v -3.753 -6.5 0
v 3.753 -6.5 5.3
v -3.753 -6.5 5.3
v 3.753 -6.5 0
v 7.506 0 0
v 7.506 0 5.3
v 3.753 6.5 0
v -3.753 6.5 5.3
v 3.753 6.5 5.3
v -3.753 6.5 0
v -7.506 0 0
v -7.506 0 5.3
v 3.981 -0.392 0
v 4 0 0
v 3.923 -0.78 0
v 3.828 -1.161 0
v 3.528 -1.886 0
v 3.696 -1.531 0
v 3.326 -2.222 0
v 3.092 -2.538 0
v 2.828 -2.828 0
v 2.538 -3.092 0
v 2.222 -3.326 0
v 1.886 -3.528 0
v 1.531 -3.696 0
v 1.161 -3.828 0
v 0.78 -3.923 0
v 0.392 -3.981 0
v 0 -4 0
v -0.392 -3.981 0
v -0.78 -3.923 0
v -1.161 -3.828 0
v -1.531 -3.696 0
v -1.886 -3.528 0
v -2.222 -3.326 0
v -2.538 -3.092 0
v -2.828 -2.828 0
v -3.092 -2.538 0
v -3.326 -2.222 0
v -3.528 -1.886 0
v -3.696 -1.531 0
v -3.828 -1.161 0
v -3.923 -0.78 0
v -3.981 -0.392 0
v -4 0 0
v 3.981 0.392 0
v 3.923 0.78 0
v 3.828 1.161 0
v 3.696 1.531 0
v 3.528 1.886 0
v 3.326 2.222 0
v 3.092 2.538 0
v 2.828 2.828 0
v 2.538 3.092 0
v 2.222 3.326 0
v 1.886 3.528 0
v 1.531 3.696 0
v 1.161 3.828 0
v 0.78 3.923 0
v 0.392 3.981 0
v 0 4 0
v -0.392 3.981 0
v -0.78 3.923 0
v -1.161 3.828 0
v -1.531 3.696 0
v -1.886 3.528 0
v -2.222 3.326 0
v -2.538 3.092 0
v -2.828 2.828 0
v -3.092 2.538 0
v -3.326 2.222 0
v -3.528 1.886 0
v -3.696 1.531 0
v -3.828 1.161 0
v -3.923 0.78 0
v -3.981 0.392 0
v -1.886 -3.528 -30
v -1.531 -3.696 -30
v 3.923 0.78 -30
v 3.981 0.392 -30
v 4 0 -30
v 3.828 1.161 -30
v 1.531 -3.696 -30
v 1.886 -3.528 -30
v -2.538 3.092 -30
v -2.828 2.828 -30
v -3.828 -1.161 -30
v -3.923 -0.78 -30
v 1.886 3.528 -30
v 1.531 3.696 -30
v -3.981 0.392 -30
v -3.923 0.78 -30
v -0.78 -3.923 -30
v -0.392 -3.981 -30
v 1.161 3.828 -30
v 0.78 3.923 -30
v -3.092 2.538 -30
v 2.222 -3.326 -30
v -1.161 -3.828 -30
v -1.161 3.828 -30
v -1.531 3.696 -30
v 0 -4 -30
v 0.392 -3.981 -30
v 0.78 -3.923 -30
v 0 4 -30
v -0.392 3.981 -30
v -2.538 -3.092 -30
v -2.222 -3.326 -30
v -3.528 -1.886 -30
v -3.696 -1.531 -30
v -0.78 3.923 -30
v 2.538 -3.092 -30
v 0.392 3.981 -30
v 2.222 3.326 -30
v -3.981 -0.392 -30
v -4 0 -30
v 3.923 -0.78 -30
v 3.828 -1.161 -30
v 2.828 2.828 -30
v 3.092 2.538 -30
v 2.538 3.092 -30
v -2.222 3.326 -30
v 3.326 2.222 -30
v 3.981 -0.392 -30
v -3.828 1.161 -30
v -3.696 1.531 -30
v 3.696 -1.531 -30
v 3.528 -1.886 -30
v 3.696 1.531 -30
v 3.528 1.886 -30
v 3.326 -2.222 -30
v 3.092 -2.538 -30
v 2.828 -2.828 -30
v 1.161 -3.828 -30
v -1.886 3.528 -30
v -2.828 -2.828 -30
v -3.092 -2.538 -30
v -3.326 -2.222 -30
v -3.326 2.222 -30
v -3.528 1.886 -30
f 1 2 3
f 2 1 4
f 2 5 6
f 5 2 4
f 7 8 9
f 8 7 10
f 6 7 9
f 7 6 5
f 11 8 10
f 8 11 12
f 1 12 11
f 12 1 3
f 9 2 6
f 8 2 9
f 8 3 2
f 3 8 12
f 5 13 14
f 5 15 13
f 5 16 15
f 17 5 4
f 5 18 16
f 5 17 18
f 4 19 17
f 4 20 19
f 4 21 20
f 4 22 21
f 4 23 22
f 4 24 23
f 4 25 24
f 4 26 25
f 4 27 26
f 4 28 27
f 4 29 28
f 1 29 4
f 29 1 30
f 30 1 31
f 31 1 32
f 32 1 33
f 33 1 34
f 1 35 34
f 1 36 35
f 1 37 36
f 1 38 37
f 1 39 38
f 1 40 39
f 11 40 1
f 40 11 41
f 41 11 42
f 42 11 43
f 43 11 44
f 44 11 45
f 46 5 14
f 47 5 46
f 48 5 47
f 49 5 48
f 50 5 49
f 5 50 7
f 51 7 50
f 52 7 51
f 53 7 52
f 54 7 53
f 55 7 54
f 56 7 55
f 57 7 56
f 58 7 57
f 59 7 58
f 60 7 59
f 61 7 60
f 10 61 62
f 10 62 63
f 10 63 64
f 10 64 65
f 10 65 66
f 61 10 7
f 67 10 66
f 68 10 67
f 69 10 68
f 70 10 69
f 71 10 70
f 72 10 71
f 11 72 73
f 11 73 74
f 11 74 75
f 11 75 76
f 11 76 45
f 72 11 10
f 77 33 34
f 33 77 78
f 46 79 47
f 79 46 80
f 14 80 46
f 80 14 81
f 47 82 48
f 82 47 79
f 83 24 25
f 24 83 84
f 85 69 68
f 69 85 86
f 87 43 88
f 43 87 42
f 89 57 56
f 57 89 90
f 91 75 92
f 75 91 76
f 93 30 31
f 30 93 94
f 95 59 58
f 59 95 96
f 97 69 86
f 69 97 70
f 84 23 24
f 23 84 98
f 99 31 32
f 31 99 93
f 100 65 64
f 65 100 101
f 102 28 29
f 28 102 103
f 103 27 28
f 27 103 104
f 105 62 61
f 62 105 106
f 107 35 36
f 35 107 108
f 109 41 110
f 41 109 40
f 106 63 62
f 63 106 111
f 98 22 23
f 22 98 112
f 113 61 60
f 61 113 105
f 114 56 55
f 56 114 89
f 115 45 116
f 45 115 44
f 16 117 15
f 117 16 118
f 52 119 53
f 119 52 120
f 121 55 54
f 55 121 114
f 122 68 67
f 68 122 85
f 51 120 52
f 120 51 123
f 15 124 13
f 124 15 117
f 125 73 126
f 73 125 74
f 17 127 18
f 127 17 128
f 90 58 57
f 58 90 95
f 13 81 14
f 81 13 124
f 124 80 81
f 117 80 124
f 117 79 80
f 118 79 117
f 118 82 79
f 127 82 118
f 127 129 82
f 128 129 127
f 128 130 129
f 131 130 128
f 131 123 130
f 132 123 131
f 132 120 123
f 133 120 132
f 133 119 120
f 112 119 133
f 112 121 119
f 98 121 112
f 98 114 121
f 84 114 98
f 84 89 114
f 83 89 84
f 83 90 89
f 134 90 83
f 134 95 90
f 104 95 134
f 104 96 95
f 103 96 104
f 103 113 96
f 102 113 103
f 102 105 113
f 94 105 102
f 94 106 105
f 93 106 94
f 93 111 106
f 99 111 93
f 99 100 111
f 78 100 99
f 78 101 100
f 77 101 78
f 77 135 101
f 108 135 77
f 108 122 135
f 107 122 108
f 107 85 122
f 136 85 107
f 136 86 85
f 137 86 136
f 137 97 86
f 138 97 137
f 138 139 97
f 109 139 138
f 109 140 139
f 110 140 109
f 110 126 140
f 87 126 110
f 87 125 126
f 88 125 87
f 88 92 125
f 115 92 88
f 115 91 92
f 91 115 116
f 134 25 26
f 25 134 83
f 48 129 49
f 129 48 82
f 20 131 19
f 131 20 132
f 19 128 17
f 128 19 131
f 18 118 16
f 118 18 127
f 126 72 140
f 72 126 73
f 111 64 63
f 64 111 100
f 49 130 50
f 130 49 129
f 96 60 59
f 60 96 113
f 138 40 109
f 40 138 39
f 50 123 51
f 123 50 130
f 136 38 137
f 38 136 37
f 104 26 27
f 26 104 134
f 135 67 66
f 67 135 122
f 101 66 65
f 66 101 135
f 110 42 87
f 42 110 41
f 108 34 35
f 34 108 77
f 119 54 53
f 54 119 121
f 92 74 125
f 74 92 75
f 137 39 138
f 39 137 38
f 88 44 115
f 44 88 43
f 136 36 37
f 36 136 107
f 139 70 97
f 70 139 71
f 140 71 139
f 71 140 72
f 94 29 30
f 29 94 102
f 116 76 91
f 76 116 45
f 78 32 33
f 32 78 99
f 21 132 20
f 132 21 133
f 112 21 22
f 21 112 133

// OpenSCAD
module bolt() {
    cylinder(h=5.3, r=(13/2)/cos(30), $fn=6);
    translate([0,0,-30])
        cylinder(h=30, r=4, $fn=64);
}

bolt();
